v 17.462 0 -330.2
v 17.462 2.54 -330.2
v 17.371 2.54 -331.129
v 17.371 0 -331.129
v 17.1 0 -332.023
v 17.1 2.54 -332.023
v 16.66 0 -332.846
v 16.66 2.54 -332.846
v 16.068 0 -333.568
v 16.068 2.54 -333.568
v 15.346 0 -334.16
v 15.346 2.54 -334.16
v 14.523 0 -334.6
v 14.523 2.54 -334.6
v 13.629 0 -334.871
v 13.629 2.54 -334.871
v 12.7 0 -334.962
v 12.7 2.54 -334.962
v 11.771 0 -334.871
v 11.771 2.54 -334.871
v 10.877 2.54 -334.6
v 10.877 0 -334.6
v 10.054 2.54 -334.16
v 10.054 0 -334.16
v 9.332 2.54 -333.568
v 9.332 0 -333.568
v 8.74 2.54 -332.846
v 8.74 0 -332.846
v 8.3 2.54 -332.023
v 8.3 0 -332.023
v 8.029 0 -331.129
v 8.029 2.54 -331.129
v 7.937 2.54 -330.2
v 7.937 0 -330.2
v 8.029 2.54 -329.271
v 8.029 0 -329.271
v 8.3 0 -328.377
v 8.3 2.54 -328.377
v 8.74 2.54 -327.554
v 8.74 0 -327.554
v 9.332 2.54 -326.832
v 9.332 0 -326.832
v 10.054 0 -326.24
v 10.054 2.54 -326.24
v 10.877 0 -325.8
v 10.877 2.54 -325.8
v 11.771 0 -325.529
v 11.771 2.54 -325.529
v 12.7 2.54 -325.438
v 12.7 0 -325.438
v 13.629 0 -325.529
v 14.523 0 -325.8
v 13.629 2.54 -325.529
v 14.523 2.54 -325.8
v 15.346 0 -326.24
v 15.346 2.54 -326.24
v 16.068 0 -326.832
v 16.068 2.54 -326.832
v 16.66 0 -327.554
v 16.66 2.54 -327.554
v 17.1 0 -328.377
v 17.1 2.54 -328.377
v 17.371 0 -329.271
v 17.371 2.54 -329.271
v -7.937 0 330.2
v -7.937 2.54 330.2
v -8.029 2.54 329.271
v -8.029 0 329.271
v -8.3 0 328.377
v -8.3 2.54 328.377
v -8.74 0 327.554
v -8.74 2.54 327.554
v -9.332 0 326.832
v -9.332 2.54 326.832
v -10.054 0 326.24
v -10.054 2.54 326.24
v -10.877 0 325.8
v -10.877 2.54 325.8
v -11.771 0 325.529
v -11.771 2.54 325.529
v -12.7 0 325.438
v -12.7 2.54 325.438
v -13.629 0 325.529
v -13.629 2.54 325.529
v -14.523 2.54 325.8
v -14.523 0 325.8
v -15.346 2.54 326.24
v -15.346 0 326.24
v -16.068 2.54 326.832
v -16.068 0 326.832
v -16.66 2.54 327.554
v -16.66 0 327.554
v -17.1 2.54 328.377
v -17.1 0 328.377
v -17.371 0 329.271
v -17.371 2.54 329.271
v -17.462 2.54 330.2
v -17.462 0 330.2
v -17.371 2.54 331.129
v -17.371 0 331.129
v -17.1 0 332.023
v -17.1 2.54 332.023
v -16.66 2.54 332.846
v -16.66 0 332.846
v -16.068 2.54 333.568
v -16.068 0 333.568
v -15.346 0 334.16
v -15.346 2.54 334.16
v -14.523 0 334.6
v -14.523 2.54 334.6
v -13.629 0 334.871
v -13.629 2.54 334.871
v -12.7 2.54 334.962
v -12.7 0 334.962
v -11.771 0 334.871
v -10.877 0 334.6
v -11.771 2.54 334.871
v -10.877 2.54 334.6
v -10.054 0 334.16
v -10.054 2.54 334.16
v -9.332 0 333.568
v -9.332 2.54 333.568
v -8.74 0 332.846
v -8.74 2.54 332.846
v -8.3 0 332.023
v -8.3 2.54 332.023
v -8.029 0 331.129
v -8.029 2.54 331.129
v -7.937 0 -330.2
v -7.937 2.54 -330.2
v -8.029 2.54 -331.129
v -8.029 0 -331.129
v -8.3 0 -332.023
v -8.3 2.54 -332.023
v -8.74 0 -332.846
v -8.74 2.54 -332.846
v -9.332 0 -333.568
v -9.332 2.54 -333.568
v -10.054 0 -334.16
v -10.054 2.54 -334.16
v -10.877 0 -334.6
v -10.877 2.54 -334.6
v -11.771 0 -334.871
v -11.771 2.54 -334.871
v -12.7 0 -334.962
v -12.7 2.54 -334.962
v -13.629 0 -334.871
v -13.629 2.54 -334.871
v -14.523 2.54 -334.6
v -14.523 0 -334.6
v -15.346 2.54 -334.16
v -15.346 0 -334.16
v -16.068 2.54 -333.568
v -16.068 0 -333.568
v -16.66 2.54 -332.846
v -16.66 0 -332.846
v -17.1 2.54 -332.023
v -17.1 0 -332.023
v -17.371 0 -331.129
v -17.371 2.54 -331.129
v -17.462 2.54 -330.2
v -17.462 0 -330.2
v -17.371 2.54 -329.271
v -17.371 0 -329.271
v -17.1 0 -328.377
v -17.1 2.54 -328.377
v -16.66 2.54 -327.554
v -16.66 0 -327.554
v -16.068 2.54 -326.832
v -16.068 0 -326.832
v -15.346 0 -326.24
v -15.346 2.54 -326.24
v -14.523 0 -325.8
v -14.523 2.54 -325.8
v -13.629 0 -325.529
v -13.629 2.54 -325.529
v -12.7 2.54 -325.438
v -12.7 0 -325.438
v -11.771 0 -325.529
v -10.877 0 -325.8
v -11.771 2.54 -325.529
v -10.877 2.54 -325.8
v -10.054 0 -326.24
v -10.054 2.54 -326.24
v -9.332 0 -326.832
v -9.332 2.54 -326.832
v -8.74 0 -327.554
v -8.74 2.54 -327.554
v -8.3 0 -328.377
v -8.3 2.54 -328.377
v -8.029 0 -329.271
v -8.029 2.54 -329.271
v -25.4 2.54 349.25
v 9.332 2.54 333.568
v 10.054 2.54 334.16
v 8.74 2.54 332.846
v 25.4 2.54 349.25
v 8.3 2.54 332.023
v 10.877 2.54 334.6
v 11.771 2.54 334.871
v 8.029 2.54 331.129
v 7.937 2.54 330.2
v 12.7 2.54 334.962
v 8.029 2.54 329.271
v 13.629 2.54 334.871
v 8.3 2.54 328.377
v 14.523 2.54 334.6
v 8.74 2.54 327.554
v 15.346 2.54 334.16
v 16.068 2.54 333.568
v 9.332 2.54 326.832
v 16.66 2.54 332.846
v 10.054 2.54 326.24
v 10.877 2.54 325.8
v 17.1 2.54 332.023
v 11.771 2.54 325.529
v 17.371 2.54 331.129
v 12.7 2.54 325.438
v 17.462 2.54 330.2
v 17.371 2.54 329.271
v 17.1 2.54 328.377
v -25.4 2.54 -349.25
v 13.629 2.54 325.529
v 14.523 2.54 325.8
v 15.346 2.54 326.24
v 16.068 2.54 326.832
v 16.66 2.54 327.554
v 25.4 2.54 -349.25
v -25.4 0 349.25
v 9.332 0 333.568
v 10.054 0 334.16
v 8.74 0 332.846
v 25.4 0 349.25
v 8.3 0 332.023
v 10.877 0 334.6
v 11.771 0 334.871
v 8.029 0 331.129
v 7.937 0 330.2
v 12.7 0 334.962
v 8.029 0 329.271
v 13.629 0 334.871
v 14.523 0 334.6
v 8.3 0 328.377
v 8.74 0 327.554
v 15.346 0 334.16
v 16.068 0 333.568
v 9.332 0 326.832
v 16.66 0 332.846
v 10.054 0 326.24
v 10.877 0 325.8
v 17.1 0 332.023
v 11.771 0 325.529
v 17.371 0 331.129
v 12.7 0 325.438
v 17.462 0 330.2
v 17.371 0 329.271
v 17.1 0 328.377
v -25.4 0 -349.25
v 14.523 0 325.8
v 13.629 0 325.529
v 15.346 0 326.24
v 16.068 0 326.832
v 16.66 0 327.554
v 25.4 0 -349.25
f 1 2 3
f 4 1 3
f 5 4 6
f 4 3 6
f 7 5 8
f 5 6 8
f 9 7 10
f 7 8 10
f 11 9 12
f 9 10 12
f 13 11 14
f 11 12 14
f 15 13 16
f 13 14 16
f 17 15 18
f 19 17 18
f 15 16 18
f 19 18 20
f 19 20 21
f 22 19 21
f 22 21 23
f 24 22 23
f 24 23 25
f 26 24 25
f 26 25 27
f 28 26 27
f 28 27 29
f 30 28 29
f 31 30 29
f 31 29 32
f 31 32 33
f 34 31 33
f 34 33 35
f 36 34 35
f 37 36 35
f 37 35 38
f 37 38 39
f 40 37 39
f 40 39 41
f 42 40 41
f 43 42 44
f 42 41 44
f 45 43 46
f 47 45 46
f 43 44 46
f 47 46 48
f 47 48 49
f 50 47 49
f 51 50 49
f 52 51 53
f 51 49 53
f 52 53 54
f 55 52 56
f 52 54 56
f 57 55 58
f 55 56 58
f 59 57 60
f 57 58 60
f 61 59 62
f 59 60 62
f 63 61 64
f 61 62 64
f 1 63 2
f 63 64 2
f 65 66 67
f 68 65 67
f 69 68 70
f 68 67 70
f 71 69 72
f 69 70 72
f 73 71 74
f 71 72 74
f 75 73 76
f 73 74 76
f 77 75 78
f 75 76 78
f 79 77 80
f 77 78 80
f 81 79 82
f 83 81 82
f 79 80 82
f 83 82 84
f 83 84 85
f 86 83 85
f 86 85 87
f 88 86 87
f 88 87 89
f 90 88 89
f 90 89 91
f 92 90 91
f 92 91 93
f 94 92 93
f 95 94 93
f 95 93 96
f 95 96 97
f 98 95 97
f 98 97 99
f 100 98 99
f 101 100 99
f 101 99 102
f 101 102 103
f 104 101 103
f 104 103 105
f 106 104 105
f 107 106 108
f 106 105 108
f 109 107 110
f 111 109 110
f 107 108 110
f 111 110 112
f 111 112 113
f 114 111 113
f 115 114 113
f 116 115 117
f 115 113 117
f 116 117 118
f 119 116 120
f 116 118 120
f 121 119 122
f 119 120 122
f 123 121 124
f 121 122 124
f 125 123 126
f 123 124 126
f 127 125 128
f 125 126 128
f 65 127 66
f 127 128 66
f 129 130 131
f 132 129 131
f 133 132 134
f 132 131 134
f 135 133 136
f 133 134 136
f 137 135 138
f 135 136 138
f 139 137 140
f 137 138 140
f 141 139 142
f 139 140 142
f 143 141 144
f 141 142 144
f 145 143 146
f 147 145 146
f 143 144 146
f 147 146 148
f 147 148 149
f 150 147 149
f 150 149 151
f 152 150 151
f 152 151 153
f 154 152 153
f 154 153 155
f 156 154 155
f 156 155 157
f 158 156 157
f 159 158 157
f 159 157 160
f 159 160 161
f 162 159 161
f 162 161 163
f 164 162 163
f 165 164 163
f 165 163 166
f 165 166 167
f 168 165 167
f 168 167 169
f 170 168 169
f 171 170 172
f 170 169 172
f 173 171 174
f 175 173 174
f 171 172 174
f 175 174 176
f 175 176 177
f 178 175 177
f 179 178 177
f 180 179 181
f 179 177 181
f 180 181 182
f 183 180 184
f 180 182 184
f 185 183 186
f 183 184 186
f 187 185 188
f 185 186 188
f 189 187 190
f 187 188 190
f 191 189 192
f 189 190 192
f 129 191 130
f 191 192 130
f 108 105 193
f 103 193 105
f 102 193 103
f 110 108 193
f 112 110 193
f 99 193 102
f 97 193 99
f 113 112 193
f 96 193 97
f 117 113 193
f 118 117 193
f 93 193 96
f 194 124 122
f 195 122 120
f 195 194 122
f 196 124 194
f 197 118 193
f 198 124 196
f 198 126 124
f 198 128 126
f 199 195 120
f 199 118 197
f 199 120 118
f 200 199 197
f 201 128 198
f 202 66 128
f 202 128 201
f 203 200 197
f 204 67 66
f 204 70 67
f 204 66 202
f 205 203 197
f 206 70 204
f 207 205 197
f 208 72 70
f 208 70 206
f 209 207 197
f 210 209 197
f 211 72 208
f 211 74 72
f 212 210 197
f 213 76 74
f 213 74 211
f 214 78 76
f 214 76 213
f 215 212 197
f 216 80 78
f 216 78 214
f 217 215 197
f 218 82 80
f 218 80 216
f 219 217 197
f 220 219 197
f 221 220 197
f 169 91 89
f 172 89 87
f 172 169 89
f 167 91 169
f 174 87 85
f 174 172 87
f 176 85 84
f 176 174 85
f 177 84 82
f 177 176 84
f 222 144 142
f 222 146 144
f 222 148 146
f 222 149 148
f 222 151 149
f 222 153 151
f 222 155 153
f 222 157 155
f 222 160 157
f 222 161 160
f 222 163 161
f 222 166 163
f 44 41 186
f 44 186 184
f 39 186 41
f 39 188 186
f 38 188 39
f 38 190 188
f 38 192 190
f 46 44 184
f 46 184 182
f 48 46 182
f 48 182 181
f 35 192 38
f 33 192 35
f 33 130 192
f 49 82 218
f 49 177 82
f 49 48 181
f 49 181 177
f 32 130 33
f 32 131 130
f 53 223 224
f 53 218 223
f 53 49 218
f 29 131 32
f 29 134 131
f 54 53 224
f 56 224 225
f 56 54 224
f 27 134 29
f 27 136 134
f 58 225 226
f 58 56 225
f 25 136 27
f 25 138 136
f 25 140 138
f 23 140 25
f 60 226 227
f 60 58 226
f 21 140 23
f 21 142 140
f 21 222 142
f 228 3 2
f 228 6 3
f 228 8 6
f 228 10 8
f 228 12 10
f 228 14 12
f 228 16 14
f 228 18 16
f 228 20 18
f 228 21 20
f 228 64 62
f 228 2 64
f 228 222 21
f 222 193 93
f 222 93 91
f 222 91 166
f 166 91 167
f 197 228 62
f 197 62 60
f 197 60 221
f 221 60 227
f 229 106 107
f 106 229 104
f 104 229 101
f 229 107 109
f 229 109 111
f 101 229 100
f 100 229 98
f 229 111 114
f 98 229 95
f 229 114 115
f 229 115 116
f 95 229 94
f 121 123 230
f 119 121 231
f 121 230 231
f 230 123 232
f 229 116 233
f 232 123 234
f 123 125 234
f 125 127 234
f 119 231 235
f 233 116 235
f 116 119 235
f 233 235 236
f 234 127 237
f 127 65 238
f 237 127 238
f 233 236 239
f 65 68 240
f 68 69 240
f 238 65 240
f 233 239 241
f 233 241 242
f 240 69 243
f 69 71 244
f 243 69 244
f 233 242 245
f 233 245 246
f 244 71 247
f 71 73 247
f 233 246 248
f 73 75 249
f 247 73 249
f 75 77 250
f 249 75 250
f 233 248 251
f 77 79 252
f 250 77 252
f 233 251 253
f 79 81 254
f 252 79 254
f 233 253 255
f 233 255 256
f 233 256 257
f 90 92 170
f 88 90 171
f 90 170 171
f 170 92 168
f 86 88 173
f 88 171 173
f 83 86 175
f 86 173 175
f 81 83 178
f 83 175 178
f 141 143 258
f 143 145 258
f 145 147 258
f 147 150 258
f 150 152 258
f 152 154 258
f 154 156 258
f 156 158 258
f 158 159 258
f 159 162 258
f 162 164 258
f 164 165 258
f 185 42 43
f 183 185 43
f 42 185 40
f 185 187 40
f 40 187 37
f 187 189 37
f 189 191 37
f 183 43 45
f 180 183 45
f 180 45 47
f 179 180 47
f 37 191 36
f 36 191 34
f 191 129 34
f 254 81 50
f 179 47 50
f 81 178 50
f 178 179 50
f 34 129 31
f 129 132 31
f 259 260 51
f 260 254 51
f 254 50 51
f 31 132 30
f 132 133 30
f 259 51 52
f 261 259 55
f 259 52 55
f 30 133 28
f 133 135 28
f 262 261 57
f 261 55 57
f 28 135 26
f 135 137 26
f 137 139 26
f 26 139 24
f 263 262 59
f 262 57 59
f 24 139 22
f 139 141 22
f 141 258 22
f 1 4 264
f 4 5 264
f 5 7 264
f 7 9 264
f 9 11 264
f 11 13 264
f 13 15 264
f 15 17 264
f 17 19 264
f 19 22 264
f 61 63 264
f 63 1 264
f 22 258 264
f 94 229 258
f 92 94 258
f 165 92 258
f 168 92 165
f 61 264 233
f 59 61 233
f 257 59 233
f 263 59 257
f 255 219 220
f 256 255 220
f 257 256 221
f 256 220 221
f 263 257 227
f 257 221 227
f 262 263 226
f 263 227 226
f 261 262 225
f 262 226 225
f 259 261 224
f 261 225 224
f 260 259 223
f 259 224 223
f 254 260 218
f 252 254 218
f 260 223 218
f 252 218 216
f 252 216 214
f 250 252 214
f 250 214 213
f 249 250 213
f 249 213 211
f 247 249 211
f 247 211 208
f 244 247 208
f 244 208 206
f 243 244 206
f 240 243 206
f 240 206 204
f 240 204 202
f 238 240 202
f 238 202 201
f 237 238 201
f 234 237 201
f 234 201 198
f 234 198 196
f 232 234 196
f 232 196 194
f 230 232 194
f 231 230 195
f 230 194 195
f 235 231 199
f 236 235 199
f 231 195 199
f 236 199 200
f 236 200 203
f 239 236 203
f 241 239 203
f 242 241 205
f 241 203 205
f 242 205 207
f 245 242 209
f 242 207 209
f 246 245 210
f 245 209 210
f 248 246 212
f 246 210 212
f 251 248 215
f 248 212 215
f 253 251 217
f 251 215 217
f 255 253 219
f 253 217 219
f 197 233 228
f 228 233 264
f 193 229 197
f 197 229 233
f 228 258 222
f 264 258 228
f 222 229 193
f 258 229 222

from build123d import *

# Parameters (mm, degrees)
SKETCH1_W               = 50.8
SKETCH1_H               = 698.5
BOSS_EXTRUDE1_DEPTH     = 2.54
SKETCH2_R               = 4.7625
CUT_EXTRUDE1_DEPTH      = 1
CUT_EXTRUDE1_DEPTH_BACK = 3.54


with BuildPart() as part:
    # Sketch1 → Boss-Extrude1 (new body)
    with BuildSketch(Plane(origin=(0, 0, 0), x_dir=(1, 0, 0), z_dir=(0, 1, 0))):
        Rectangle(SKETCH1_W, SKETCH1_H)
    extrude(amount=BOSS_EXTRUDE1_DEPTH)

    # Sketch2 → Cut-Extrude1 (cut, two sides)
    with BuildSketch(Plane(origin=(0, 2.54, 0), x_dir=(1, 0, 0), z_dir=(0, 1, 0))) as cut_extrude1_sk:
        with Locations((-12.7, 330.2)):
            Circle(SKETCH2_R)
        with Locations((12.7, 330.2)):
            Circle(SKETCH2_R)
        with Locations((12.7, -330.2)):
            Circle(SKETCH2_R)
        with Locations((-12.7, -330.2)):
            Circle(SKETCH2_R)
    extrude(amount=CUT_EXTRUDE1_DEPTH, mode=Mode.SUBTRACT)
    extrude(cut_extrude1_sk.sketch, amount=-CUT_EXTRUDE1_DEPTH_BACK, mode=Mode.SUBTRACT)


solid = part.part
